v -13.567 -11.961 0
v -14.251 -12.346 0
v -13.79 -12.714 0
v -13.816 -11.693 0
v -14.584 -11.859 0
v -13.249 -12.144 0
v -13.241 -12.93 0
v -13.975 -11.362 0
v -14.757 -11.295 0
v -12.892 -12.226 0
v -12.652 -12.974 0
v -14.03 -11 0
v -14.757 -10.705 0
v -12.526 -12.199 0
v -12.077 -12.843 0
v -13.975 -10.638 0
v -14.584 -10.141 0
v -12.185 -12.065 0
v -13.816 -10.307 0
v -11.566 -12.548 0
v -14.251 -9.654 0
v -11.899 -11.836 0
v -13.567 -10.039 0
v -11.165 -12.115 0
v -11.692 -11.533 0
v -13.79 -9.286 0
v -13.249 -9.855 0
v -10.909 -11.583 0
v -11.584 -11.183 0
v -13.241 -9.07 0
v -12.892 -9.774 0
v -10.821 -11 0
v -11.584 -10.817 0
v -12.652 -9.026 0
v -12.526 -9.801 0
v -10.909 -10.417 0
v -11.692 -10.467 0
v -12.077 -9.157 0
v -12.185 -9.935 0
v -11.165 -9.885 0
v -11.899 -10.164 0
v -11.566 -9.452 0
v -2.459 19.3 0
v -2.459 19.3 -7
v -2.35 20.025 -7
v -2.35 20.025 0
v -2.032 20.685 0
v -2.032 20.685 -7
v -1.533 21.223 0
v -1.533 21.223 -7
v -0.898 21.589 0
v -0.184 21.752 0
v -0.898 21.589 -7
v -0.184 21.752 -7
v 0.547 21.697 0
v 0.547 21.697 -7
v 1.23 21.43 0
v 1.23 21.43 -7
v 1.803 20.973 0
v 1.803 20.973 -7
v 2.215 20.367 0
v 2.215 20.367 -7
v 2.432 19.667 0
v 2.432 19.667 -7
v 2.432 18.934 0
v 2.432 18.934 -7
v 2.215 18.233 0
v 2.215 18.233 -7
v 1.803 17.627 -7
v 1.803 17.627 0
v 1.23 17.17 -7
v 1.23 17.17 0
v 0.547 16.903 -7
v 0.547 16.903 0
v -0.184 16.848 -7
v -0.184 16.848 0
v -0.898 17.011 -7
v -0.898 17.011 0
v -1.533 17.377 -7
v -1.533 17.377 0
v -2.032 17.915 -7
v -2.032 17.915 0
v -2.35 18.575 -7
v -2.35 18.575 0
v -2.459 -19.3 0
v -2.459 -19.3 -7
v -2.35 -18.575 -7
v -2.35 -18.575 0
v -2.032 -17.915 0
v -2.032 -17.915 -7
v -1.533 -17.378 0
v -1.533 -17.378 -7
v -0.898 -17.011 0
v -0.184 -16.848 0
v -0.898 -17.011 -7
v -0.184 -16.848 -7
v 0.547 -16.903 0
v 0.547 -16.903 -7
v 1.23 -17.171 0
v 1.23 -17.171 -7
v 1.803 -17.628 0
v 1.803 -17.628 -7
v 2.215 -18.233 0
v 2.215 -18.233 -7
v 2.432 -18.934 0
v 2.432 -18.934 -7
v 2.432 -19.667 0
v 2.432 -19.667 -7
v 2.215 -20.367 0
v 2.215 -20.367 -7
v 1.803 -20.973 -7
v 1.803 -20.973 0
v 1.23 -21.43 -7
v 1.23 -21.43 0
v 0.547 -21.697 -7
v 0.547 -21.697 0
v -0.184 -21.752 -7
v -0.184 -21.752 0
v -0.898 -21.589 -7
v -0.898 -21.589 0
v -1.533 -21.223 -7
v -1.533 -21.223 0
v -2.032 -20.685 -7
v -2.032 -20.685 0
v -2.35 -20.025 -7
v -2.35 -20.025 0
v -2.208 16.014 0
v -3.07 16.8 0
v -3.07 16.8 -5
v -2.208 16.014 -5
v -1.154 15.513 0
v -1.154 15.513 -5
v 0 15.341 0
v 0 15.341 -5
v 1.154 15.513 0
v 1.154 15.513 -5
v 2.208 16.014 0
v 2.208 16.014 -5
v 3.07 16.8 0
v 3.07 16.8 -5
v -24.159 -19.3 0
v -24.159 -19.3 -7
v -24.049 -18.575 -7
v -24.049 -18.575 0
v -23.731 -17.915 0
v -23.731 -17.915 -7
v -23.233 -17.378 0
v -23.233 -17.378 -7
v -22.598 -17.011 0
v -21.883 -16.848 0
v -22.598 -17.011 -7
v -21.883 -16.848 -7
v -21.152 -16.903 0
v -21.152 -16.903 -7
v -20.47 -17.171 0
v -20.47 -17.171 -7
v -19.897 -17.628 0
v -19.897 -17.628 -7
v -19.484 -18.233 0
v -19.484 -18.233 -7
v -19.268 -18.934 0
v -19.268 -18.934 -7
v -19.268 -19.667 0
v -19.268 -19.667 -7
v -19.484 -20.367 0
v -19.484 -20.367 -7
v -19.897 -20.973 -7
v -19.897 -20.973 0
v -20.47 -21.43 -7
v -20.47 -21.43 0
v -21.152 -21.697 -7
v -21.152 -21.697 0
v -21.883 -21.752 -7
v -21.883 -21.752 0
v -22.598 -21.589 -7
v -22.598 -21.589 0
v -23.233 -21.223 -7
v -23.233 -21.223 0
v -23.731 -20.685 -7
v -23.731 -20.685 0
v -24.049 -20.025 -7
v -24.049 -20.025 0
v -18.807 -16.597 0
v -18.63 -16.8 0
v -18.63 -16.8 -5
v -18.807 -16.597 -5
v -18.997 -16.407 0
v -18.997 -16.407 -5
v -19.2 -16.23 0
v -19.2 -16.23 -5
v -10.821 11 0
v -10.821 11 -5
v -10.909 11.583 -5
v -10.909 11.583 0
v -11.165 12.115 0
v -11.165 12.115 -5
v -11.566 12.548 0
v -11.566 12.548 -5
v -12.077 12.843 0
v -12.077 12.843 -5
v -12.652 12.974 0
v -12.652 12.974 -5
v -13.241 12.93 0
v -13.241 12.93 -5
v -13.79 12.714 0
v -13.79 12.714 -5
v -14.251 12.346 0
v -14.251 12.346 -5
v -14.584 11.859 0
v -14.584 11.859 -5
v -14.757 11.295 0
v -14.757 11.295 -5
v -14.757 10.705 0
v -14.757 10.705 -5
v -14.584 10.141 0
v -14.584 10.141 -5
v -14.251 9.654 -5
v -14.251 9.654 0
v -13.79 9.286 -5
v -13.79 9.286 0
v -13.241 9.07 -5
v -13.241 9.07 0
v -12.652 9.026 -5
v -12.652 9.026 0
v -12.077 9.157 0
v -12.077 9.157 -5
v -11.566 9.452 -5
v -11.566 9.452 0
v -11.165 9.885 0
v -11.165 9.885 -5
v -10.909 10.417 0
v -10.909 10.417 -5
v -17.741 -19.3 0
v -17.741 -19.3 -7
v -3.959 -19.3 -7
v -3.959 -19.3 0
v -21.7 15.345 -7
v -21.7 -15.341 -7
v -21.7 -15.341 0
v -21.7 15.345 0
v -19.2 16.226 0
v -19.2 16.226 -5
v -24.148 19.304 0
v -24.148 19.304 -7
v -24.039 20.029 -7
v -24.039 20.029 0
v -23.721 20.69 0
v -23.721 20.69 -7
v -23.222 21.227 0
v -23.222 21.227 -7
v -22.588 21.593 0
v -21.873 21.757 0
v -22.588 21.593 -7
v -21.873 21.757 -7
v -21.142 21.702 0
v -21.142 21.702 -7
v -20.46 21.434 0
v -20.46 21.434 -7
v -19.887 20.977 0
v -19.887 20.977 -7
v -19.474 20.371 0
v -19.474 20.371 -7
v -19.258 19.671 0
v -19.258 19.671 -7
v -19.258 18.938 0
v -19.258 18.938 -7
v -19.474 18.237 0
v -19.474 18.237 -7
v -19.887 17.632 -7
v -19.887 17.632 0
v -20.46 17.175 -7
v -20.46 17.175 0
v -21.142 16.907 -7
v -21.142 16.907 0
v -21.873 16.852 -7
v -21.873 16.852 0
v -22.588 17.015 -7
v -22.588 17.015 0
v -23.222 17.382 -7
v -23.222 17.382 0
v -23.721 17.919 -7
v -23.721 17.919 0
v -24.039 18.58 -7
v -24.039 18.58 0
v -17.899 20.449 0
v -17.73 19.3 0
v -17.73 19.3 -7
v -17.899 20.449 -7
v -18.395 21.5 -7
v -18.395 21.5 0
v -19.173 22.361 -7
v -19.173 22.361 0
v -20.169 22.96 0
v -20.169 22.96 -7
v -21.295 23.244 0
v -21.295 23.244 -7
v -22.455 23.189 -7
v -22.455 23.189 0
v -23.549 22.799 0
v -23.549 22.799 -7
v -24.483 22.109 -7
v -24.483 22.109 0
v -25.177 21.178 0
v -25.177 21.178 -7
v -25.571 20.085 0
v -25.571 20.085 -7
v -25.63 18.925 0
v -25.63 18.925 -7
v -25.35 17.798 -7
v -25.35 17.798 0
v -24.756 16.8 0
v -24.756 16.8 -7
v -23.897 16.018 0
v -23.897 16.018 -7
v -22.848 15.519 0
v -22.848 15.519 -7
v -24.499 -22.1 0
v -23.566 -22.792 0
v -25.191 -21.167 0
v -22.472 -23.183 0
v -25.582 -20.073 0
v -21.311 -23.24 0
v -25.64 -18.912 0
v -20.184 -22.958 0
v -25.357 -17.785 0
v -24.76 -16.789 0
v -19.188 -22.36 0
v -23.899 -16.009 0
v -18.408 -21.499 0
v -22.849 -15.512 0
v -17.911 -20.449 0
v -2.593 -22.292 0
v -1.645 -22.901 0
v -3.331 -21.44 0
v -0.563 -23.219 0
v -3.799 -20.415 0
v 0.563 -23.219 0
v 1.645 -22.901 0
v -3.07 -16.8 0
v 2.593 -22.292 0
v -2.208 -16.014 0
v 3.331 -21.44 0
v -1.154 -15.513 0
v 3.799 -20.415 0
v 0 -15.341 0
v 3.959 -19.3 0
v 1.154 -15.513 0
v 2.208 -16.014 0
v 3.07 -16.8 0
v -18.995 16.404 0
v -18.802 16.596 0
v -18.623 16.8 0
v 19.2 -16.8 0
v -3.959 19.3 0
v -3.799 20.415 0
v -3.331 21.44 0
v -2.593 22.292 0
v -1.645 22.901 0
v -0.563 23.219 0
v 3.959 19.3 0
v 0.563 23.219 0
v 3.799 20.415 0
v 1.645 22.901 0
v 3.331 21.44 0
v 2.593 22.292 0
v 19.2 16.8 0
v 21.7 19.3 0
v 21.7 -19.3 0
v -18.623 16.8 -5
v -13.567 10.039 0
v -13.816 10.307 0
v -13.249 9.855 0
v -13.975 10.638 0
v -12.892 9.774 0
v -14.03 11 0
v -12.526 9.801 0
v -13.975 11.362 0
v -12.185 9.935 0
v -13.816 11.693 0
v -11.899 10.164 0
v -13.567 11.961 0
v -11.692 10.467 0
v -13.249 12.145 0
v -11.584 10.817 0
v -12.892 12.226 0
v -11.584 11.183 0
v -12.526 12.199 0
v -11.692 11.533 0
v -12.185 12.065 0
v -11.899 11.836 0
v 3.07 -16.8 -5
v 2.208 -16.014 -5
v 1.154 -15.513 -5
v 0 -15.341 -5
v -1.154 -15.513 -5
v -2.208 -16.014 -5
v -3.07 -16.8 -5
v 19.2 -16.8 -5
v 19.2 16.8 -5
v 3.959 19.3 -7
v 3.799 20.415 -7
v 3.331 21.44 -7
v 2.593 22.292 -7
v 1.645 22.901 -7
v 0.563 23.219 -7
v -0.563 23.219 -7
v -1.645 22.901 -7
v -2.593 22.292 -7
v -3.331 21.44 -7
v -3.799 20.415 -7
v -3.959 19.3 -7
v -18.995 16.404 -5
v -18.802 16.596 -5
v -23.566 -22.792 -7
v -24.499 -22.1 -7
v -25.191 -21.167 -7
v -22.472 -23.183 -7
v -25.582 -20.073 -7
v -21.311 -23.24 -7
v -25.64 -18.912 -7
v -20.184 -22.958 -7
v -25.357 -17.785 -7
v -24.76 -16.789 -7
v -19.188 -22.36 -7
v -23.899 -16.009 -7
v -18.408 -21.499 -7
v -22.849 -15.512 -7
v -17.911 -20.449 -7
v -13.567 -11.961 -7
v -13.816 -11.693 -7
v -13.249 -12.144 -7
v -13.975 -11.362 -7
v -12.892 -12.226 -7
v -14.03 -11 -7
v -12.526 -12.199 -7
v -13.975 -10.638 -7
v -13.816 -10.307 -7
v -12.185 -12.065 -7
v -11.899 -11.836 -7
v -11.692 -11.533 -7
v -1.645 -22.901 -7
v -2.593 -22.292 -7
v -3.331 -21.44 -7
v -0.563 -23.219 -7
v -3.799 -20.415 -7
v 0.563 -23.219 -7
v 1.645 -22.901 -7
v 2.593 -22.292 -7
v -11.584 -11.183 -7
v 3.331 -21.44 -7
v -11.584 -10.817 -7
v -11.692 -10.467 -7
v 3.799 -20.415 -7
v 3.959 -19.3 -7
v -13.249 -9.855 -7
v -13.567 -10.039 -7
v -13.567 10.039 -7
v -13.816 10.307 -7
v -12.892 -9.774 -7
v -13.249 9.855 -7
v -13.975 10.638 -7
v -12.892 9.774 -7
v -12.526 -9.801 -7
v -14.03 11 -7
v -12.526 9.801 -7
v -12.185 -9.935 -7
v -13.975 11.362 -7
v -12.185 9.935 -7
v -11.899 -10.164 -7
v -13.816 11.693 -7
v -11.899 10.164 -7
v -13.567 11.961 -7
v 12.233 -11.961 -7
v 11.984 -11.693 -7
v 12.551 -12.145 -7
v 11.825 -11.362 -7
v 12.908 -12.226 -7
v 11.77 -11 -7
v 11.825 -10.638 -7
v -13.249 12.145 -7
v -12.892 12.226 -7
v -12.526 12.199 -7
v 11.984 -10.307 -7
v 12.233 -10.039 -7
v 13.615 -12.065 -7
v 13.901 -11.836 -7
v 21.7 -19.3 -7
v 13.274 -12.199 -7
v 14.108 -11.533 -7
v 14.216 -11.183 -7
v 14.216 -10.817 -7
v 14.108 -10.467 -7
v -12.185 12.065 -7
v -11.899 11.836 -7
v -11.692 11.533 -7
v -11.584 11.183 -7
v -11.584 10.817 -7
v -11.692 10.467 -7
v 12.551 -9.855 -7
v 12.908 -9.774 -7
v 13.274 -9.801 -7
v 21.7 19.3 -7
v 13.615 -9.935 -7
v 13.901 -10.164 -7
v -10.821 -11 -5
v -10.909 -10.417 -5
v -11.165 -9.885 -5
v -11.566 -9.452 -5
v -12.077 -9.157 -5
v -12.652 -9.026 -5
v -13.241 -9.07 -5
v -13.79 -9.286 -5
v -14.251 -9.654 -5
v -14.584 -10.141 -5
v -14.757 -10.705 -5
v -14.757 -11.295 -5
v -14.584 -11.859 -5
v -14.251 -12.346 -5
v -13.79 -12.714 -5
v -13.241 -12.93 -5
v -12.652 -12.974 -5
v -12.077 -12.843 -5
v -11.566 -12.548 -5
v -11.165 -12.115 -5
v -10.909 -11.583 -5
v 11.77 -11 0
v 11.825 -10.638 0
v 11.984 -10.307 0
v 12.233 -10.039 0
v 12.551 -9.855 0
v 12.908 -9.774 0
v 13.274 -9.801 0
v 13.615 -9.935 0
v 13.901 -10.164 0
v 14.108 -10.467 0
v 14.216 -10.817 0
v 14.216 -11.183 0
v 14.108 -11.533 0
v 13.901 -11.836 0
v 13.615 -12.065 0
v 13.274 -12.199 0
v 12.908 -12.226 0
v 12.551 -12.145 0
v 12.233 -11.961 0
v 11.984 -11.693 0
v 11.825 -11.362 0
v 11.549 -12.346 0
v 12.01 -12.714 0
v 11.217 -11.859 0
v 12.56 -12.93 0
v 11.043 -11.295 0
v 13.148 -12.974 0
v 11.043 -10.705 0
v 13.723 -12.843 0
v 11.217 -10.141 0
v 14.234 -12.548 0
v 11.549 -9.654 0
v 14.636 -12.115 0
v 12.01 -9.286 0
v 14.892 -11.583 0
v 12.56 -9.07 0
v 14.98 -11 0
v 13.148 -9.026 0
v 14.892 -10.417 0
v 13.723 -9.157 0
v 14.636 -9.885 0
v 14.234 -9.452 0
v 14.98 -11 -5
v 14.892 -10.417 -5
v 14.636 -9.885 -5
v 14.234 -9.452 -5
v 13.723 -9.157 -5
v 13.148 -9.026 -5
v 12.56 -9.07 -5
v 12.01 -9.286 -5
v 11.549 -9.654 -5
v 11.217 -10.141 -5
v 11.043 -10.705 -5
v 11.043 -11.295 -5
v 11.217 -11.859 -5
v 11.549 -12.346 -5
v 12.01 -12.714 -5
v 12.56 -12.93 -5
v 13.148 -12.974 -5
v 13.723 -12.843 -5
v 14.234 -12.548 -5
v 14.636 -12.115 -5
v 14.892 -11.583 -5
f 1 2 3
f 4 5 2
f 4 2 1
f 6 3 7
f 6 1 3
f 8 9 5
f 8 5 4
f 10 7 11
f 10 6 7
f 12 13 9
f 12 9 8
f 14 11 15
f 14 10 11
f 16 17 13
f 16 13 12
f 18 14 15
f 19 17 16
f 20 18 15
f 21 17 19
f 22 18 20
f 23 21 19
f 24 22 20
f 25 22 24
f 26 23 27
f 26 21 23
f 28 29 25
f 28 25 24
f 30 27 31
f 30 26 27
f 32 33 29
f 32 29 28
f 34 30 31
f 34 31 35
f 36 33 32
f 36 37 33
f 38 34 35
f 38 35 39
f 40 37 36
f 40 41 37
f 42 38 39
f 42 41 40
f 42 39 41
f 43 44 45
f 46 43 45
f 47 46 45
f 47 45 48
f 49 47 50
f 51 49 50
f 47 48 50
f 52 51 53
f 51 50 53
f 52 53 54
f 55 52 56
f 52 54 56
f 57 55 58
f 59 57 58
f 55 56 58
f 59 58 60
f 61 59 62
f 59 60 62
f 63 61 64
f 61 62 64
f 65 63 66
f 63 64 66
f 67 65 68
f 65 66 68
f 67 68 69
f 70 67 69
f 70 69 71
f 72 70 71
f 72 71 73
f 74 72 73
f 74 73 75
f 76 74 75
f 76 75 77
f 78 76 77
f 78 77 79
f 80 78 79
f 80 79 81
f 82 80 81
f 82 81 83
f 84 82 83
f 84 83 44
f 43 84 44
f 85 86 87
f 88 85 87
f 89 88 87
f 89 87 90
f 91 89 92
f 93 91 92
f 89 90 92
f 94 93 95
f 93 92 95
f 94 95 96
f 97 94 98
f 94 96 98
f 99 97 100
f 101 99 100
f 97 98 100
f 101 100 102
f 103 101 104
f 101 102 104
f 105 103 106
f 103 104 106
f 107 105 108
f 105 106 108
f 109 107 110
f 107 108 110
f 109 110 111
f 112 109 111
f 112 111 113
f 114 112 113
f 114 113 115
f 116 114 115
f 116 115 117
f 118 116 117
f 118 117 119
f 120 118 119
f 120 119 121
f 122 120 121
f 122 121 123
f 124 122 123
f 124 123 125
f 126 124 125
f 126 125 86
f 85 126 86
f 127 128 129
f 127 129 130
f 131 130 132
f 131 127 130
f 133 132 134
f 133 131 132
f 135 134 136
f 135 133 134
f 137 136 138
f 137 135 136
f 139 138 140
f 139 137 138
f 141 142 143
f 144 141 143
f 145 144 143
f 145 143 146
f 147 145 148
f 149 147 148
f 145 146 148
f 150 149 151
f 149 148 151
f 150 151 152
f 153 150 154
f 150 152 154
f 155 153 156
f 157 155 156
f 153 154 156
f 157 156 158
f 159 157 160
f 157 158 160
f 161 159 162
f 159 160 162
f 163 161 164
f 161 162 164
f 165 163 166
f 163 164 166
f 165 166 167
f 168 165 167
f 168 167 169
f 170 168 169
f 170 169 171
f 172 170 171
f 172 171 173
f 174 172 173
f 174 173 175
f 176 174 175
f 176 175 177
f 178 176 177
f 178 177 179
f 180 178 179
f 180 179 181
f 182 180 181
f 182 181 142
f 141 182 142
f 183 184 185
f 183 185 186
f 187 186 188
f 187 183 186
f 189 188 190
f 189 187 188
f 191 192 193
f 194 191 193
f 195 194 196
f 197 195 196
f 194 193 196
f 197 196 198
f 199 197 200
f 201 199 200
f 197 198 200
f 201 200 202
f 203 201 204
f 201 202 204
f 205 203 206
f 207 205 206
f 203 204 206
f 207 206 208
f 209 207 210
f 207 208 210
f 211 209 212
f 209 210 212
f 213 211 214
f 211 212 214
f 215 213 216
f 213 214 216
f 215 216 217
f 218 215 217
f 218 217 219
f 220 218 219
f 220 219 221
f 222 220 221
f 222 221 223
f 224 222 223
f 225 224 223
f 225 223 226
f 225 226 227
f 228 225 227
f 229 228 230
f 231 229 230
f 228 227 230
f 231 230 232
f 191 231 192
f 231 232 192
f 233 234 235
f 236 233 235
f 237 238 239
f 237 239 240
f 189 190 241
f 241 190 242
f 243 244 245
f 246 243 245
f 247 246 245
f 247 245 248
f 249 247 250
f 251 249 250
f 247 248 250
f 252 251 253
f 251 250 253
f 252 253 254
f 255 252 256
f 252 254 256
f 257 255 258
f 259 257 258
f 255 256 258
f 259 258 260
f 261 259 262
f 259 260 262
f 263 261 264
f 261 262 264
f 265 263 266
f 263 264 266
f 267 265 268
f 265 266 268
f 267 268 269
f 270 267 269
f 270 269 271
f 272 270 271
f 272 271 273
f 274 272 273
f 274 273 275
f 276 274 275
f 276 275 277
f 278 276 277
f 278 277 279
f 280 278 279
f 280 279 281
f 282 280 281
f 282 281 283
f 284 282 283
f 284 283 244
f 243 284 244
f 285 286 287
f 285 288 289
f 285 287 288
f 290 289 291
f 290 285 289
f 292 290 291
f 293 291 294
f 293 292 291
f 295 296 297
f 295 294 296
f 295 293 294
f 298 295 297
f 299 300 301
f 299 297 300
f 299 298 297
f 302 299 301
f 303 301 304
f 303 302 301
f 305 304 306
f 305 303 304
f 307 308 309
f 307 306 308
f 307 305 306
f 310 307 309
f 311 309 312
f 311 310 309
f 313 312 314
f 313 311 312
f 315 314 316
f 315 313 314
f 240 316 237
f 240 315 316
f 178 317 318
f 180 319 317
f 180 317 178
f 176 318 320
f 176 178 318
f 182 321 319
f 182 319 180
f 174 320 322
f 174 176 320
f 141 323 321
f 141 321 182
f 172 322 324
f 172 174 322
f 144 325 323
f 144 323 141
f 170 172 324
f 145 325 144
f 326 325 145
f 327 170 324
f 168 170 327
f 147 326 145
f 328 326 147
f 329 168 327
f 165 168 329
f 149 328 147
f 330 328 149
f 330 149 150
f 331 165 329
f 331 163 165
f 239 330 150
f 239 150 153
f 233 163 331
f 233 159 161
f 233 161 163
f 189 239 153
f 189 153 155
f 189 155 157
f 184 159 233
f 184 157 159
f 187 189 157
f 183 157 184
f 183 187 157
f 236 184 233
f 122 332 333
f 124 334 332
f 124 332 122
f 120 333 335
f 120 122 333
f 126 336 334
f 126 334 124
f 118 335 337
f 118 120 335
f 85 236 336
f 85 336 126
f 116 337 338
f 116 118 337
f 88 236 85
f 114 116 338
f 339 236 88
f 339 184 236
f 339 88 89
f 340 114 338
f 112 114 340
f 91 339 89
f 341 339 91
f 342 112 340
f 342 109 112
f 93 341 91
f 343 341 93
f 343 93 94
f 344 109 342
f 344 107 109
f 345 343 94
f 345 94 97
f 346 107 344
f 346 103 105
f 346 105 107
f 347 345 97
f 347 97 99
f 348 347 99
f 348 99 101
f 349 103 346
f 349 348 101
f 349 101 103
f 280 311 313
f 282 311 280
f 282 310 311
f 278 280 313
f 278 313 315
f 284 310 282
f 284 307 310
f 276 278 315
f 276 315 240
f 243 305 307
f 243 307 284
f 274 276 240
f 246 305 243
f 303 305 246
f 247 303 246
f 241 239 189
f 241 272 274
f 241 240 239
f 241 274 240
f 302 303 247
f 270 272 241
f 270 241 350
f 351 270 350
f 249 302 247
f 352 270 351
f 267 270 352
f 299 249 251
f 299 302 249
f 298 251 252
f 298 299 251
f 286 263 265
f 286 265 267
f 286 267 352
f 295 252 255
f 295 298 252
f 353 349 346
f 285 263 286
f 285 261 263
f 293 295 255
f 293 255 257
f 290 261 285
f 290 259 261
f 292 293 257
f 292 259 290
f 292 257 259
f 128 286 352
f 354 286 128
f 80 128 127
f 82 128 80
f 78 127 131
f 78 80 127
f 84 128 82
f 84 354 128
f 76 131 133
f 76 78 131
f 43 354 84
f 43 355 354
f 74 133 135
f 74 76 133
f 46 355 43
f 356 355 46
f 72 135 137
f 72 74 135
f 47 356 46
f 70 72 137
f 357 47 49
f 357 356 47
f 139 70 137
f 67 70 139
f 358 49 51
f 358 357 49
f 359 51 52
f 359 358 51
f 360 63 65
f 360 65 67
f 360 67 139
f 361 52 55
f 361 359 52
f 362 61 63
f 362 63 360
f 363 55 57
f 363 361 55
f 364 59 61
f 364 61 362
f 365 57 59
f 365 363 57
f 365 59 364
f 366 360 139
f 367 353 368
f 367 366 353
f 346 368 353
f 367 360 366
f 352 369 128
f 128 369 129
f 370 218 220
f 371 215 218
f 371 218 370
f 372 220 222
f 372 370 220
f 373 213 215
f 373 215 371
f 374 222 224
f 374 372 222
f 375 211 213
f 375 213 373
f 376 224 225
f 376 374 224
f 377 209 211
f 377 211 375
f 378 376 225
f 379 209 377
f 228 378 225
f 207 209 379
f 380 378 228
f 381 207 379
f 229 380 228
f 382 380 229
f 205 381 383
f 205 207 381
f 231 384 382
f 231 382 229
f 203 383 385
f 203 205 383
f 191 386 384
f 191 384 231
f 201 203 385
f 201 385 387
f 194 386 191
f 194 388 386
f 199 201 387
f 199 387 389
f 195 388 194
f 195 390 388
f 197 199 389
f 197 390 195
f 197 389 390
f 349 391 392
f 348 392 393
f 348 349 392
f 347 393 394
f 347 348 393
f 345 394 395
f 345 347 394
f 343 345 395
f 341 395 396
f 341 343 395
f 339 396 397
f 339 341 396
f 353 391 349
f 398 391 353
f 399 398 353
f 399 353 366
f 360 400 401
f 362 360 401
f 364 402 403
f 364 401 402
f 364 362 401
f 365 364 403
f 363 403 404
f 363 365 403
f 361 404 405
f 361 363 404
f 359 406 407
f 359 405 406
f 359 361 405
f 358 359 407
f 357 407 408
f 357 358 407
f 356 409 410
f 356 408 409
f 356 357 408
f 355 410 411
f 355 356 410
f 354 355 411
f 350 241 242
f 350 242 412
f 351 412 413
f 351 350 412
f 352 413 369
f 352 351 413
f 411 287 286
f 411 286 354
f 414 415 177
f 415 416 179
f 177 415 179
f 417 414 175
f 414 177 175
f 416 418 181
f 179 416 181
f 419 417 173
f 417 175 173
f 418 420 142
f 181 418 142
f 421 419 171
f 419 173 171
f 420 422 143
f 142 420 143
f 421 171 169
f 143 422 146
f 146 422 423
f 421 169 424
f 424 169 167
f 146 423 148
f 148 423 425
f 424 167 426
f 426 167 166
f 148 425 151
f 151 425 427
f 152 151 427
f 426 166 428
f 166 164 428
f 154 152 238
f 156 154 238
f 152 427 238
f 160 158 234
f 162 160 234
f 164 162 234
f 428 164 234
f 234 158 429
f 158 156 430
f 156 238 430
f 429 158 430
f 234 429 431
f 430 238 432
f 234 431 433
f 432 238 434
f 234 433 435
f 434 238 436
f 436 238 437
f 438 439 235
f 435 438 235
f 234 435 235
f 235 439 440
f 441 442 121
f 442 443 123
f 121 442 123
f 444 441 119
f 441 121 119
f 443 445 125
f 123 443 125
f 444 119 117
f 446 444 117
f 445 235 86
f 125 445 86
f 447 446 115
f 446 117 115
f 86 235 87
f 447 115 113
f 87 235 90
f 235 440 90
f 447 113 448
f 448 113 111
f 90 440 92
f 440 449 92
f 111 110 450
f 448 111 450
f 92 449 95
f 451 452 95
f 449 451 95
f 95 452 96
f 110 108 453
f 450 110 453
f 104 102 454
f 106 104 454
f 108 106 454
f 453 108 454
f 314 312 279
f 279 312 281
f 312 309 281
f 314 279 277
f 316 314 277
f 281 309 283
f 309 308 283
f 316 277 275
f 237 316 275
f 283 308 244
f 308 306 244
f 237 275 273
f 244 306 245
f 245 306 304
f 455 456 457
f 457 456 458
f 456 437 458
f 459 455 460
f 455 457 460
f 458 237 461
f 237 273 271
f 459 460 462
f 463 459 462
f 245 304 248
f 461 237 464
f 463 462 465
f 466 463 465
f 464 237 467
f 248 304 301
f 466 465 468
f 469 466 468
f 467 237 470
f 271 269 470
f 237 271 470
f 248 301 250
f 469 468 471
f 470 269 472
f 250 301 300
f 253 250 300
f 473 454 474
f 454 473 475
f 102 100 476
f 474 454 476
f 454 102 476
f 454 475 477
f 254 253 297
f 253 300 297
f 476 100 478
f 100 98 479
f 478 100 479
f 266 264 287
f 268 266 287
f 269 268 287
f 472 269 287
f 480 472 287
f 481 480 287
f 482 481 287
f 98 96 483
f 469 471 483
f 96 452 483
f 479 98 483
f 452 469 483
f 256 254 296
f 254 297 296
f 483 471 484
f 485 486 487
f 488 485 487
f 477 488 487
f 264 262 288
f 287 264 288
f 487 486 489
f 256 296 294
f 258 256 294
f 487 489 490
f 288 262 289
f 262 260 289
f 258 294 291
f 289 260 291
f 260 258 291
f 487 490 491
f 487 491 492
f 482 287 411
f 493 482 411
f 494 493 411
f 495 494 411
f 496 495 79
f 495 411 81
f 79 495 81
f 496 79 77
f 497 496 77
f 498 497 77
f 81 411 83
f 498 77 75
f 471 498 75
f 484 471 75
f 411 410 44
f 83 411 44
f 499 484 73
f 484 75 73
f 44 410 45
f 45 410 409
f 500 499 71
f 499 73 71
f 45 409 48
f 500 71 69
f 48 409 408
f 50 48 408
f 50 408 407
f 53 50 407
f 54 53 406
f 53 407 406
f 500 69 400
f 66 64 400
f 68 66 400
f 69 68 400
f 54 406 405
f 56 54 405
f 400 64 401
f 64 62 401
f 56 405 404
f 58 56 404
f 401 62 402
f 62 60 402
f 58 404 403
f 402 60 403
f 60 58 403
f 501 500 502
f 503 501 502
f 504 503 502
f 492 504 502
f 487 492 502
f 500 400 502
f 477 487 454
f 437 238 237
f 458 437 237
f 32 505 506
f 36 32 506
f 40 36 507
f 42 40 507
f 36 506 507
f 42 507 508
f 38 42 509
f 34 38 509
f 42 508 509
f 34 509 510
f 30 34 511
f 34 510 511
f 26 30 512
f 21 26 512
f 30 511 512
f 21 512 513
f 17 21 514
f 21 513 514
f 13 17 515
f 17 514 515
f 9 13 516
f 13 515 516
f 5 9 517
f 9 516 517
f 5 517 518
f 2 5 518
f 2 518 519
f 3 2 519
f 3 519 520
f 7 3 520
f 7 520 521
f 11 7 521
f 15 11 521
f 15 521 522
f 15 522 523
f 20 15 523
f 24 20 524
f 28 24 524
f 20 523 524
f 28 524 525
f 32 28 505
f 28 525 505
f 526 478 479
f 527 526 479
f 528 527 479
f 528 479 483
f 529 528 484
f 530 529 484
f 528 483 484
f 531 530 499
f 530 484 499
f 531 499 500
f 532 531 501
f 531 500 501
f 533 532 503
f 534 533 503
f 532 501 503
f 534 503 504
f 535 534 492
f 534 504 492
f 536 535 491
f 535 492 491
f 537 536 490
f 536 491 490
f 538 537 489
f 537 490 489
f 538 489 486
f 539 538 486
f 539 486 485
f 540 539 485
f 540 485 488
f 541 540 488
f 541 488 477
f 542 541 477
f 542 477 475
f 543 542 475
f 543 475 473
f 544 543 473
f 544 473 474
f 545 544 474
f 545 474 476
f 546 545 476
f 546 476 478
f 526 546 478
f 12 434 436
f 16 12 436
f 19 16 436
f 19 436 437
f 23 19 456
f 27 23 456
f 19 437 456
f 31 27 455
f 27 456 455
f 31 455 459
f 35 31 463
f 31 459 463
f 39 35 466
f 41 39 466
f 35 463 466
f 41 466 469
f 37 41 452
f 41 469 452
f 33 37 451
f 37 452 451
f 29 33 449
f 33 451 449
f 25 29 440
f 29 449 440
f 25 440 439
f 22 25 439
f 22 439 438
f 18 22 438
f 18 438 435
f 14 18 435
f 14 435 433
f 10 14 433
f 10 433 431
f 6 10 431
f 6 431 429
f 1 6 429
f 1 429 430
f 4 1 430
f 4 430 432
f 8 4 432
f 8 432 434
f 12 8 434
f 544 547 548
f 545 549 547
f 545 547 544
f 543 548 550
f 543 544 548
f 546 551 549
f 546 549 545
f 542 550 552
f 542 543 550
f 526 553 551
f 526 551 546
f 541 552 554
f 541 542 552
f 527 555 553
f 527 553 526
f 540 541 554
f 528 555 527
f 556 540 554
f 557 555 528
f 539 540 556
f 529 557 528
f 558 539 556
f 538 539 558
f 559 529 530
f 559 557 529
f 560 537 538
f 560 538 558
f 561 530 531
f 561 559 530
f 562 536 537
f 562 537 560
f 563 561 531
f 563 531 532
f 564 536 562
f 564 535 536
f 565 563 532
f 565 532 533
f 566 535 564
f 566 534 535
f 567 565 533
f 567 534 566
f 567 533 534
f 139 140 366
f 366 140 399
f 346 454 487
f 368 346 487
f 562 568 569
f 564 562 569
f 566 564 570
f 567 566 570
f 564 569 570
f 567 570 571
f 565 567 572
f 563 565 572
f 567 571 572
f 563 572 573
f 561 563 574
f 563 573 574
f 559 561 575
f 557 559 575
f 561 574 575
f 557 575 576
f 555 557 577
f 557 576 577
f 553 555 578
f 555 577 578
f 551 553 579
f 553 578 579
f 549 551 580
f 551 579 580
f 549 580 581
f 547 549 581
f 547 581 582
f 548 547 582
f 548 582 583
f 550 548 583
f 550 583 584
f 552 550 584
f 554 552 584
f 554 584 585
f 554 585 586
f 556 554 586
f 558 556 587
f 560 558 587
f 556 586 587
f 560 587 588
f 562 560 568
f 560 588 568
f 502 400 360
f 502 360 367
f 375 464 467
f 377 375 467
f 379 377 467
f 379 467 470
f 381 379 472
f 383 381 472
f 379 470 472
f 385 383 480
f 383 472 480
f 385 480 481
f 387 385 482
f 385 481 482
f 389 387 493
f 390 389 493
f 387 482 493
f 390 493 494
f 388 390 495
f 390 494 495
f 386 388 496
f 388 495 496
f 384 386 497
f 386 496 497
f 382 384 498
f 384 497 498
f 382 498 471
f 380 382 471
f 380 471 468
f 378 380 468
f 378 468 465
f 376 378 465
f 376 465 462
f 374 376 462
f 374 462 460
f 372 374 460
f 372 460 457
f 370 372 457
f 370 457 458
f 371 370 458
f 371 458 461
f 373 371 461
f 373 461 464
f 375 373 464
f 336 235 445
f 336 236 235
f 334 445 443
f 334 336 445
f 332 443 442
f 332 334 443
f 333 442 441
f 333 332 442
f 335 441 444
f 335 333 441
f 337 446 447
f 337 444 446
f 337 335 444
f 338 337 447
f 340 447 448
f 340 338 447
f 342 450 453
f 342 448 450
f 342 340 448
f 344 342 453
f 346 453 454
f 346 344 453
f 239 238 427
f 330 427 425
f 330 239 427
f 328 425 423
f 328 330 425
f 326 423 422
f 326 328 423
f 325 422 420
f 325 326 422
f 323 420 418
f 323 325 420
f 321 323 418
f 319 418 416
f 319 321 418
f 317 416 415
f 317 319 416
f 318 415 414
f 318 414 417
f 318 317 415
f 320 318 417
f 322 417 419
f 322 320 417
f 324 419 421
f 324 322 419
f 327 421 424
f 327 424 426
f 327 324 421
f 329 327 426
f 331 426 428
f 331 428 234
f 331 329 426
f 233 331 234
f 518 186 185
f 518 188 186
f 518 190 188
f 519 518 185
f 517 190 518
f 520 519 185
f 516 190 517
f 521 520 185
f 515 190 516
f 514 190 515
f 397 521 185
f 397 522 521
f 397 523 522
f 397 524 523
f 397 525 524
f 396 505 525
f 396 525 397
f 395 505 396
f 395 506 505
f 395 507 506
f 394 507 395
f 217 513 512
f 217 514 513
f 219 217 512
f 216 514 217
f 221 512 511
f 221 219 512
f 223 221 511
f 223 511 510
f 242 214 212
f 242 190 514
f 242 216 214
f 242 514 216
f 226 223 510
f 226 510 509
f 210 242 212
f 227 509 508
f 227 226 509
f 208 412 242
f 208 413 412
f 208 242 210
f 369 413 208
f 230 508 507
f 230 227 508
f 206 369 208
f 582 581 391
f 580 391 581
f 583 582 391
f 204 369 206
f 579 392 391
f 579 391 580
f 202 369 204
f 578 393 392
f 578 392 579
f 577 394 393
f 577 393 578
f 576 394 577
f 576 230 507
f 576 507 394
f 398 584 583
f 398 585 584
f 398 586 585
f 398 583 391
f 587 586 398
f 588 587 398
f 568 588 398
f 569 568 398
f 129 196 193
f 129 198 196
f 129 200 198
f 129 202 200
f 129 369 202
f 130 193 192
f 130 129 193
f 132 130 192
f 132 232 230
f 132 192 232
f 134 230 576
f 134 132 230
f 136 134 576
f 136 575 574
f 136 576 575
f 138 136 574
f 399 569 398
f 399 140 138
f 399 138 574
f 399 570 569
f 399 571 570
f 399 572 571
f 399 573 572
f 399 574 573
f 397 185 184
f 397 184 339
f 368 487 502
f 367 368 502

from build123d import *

# Parameters (mm, degrees)
F7_W         = 43.4
F7_H         = 38.6
F8_DEPTH     = 7
F6_W         = 38.4
F6_H         = 33.6
F9_DEPTH     = 7
F10_DEPTH    = 2
F11_R        = 1.9795
F12_DEPTH    = 5
F15_R        = 3.959
F16_DEPTH    = 7
F17_D        = 4.918
F18_D        = 2.459
F18_ON_F11_D = 2.459


with BuildPart() as f8:
    # F7 (on Top) → F8 (new body)
    with BuildSketch(Plane.XY):
        Rectangle(F7_W, F7_H)
    extrude(amount=F8_DEPTH)

    # F6 (on Top) → F9 (cut)
    with BuildSketch(Plane.XY):
        Rectangle(F6_W, F6_H)
    extrude(amount=F9_DEPTH, mode=Mode.SUBTRACT)

    # F6 (on Top) → F10 (join)
    with BuildSketch(Plane.XY):
        Rectangle(F6_W, F6_H)
    extrude(amount=F10_DEPTH)

    # F11 (on face) → F12 (join)
    with BuildSketch(Plane.XY.offset(2)):
        with Locations((-12.8000564873, 10.9999701381)):
            Circle(F11_R)
        with Locations((13.0001017824, -10.9999775887)):
            Circle(F11_R)
        with Locations((-12.8000564873, -10.9999775887)):
            Circle(F11_R)
    extrude(amount=F12_DEPTH)


with BuildPart() as f8_1:
    # F13: moved
    add(f8.part.moved(Location((0, 0, -7))))

    # F15 (on face) → F16 (join)
    with BuildSketch(Plane.XY):
        with Locations((-21.6995608062, -19.3000994623)):
            Circle(F15_R)
        with Locations((0, -19.3000994623)):
            Circle(F15_R)
        with Locations((0, 19.3000193685)):
            Circle(F15_R)
        with Locations((-21.6892641038, 19.3044058979)):
            Circle(F15_R)
    extrude(amount=-F16_DEPTH)

    # F17 (through all)
    with Locations(Plane.XY):
        with Locations((-21.6892641038, 19.3044058979), (0, 19.3000193685), (0, -19.3000994623), (-21.6995608062, -19.3000994623)):
            Hole(F17_D / 2)

    # F18 (through all)
    with Locations(Plane.XY):
        with Locations((-12.8, 11), (13, -11)):
            Hole(F18_D / 2)

    # F18 on F11 (through all)
    with Locations(Plane.XY.offset(2)):
        with Locations((-12.8000564873, -10.9999775887)):
            Hole(F18_ON_F11_D / 2)


solid = f8_1.part
